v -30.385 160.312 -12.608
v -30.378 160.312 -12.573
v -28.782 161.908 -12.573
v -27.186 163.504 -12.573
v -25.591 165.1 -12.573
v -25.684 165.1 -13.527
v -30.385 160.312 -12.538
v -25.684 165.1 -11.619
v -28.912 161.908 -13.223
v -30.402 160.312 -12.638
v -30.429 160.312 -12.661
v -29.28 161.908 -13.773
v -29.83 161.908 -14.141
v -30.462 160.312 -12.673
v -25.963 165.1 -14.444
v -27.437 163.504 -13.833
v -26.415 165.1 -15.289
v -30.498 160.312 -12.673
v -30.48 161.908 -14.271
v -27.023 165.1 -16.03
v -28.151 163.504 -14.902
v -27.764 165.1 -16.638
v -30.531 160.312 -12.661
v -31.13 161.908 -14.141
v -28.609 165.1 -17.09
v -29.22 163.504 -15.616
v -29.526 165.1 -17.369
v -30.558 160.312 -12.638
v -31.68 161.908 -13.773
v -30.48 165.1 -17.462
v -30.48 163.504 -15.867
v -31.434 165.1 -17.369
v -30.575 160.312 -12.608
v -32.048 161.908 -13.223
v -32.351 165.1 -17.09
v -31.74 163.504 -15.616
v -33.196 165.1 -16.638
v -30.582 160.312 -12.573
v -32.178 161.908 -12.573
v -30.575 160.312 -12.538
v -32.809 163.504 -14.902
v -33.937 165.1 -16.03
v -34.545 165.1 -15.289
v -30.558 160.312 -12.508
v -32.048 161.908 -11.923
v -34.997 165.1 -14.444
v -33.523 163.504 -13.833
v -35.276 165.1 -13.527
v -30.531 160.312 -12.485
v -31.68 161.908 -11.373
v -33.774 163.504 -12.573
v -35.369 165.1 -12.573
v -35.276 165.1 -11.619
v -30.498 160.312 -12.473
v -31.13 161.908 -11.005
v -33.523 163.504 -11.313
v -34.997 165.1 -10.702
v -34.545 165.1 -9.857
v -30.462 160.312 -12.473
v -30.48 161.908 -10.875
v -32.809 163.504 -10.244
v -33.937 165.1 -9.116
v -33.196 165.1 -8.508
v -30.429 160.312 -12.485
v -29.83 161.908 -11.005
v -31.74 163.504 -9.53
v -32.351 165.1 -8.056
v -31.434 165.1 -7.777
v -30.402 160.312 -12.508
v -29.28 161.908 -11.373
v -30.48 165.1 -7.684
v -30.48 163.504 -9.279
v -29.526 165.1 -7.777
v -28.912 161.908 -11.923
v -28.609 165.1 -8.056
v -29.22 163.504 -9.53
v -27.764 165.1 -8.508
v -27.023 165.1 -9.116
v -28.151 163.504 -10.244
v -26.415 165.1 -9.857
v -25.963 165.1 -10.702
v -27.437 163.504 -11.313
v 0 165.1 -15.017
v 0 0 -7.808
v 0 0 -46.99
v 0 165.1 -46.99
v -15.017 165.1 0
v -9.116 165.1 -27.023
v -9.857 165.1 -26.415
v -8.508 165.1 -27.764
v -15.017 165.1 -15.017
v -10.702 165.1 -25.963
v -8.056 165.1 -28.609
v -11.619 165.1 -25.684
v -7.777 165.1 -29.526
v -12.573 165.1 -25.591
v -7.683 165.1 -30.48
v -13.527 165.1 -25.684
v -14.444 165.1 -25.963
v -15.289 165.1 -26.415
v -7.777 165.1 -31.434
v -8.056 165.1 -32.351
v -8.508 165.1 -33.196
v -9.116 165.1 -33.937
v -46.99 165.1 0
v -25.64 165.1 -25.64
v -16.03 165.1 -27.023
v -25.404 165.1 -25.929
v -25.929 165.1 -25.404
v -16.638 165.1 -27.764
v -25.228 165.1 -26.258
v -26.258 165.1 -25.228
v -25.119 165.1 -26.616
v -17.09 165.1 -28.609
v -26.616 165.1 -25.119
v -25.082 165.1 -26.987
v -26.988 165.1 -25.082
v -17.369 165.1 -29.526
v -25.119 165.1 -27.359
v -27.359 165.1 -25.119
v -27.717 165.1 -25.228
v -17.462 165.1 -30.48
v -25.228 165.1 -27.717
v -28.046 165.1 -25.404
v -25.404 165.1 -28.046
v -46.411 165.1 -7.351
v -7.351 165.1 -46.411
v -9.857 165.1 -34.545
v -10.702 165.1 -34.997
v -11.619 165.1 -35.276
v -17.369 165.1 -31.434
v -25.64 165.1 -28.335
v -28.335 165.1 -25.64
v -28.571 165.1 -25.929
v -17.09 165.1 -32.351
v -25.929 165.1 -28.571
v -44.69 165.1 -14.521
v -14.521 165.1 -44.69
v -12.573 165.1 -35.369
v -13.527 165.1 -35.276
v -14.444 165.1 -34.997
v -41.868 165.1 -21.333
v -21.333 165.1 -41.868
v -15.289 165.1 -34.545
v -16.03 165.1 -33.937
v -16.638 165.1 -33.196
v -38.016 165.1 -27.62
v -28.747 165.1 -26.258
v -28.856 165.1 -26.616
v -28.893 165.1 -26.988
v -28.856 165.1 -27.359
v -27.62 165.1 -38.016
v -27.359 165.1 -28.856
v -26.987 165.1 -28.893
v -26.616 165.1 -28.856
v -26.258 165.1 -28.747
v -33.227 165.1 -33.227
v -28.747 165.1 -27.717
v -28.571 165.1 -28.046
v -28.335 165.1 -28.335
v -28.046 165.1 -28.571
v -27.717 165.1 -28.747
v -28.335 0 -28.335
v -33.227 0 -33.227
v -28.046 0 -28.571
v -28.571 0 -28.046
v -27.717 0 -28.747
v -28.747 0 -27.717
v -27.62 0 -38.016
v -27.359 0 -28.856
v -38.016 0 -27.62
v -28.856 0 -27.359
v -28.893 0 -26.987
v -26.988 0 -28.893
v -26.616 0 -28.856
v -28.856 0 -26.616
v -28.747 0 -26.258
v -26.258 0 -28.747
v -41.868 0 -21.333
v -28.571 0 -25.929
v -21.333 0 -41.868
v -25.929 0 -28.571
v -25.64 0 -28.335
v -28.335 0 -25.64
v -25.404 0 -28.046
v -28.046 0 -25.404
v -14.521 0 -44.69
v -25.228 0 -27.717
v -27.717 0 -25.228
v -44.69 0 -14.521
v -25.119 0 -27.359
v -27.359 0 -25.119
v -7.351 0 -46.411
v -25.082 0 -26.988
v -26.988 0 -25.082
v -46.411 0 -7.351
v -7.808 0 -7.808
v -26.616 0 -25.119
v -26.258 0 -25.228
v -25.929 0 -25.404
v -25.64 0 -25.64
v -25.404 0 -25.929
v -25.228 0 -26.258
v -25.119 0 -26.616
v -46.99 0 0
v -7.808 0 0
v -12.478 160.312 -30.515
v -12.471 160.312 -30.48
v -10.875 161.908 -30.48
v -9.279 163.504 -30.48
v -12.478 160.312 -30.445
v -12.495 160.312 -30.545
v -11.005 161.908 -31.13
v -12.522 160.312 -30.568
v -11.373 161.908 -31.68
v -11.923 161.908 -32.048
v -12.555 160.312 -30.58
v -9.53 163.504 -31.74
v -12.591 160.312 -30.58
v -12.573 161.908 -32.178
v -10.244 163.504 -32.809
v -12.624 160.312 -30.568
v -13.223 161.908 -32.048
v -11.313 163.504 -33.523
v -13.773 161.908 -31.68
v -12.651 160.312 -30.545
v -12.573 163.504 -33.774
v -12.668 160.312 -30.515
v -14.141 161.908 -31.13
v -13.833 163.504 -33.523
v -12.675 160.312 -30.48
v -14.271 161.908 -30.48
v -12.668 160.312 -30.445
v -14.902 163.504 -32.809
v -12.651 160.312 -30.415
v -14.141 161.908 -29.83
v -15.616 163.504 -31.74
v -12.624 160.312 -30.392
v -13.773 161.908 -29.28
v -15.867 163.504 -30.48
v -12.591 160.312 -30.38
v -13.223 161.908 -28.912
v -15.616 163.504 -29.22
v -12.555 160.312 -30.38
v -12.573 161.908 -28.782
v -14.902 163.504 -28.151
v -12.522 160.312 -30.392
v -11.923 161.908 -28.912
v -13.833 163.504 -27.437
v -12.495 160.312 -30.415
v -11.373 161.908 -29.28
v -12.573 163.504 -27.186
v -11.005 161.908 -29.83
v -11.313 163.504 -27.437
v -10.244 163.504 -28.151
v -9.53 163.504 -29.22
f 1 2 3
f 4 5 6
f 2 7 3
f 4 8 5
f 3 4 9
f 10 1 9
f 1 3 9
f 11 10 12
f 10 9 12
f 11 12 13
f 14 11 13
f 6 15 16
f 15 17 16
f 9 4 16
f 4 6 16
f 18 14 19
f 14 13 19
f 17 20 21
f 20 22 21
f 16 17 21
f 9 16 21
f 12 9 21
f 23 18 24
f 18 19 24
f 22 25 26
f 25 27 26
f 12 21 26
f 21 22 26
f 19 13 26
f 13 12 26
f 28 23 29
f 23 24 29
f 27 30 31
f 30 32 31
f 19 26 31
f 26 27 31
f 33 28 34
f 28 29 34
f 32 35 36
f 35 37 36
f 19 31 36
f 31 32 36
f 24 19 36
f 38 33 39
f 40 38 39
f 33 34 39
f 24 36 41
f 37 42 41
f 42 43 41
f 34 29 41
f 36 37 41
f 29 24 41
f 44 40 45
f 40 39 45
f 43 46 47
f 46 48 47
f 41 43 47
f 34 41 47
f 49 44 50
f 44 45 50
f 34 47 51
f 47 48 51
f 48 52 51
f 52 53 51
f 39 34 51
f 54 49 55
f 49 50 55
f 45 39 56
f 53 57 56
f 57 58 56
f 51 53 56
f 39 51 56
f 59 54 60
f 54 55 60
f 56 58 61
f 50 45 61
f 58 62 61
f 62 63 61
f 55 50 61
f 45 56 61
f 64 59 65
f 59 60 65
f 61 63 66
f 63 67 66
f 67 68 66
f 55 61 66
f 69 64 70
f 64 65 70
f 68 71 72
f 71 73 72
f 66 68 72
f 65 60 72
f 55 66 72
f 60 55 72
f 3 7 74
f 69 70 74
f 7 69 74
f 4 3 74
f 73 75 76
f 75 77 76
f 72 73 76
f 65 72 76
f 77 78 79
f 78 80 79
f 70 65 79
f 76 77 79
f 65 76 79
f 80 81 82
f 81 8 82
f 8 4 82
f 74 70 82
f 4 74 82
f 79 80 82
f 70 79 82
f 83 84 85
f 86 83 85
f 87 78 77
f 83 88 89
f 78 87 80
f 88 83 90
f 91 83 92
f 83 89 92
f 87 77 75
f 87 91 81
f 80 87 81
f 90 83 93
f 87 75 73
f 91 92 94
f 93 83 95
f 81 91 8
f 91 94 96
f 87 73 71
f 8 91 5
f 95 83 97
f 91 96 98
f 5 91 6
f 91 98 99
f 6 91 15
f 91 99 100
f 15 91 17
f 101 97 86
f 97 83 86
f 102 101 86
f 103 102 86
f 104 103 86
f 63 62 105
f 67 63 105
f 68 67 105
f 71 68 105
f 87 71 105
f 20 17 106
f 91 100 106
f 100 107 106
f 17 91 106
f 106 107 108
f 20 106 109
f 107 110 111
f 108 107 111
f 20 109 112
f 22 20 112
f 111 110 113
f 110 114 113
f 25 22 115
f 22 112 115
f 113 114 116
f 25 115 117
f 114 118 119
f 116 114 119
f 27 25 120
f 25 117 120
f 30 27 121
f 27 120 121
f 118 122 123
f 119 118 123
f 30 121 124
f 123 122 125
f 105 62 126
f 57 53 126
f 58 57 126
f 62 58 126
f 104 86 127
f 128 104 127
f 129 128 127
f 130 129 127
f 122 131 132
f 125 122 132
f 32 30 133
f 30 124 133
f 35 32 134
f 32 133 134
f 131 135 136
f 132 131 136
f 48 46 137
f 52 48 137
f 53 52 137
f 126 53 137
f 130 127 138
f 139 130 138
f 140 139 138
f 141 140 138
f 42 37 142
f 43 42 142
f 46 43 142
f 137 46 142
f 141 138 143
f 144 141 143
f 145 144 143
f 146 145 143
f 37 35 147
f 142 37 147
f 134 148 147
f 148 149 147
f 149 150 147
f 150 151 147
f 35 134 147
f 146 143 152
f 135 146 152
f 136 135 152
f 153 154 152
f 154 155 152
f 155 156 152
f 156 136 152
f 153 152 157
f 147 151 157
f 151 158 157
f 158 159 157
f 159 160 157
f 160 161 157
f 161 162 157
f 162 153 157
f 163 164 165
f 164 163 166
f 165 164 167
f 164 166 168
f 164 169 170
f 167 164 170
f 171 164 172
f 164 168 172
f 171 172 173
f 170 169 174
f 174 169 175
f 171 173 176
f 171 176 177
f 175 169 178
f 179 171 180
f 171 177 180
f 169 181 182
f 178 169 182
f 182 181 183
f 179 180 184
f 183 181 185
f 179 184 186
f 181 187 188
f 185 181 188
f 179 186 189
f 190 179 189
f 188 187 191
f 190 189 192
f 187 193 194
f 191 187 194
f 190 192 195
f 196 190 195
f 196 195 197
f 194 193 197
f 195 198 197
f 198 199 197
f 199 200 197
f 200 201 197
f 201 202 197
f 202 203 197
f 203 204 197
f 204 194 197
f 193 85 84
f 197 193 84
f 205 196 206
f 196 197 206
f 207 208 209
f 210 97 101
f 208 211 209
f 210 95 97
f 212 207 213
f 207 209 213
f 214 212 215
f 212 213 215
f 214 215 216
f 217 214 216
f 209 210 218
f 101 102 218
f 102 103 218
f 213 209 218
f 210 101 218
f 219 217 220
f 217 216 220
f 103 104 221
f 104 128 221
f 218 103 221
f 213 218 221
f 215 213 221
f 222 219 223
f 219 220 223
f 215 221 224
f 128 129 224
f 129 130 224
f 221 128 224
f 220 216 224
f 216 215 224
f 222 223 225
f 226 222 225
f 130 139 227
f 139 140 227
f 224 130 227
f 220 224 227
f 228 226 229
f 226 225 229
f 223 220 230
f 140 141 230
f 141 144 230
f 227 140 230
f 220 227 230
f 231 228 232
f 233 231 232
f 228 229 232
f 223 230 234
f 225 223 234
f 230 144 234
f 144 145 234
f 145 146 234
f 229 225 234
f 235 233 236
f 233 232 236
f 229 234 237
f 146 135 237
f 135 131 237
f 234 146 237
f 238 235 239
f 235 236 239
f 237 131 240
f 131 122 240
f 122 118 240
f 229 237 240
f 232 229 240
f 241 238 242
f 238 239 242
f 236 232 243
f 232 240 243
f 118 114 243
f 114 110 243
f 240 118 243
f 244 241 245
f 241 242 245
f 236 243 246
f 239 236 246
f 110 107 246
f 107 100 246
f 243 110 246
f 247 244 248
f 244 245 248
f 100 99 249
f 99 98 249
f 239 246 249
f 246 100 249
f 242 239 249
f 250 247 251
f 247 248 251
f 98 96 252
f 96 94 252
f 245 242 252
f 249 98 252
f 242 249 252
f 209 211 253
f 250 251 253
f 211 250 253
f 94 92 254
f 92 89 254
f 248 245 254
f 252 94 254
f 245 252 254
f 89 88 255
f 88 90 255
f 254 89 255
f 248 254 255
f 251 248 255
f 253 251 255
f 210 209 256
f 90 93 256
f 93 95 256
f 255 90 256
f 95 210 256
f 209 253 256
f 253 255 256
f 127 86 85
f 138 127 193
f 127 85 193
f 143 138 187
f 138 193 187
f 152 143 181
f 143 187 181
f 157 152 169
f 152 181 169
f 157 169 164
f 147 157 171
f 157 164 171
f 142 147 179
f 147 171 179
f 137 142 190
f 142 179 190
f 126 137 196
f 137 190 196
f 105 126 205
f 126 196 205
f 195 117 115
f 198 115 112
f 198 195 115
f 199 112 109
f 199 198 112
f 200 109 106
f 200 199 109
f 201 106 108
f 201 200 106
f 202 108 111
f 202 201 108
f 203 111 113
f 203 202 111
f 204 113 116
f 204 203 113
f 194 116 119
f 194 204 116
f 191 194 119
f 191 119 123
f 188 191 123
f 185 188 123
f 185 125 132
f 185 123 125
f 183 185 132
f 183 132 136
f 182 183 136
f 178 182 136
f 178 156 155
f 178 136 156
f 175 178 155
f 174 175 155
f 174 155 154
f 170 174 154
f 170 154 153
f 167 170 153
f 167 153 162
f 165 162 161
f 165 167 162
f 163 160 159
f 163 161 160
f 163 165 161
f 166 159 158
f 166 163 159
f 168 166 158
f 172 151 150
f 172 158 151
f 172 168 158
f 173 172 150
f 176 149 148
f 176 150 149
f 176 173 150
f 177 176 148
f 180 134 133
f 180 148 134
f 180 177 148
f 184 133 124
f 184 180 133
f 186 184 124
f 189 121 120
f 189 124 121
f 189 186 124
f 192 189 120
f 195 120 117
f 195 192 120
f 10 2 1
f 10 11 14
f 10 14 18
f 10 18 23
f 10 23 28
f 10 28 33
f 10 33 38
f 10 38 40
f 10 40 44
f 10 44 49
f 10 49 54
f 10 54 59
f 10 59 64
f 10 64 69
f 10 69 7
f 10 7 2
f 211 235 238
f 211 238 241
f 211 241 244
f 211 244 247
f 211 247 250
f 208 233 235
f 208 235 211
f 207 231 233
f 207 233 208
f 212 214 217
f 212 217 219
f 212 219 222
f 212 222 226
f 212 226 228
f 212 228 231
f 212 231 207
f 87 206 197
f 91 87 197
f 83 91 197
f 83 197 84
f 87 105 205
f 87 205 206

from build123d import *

# Parameters (mm, degrees)
SKETCH1_R                    = 46.99
BOSS_EXTRUDE1_DEPTH          = 330.2
SKETCH2_W                    = 44.45
SKETCH2_H                    = 44.45
CUT_EXTRUDE1_DEPTH           = 330.2
CUT_EXTRUDE1_DRAFT           = -2.5
CUT_EXTRUDE2_START           = -330.2
SKETCH3_R                    = 1.905
CUT_EXTRUDE2_DEPTH           = 330.2
CUT_EXTRUDE4_START           = -165.1
CUT_EXTRUDE4_DEPTH           = 165.1
SKETCH8_R                    = 4.8895
CUT_EXTRUDE5_DEPTH           = 4.7879
CUT_EXTRUDE5_DRAFT           = -45
CUT_EXTRUDE5_PROFILE_2_DEPTH = 4.7879
CUT_EXTRUDE5_PROFILE_2_DRAFT = -45


with BuildPart() as part:
    # Sketch1 → Boss-Extrude1 (new body)
    with BuildSketch(Plane(origin=(0, 0, 0), x_dir=(1, 0, 0), z_dir=(0, 1, 0))):
        with Locations(Location((0, 0, 0), (0, 0, 270))):
            Circle(SKETCH1_R)
    extrude(amount=BOSS_EXTRUDE1_DEPTH)


with BuildPart() as cut_extrude1_tool:
    # Sketch2 → Cut-Extrude1 (with draft: the straight prism first)
    with BuildSketch(Plane(origin=(0, 330.2, 0), x_dir=(1, 0, 0), z_dir=(0, 1, 0))):
        Rectangle(SKETCH2_W, SKETCH2_H)
    extrude(amount=-CUT_EXTRUDE1_DEPTH)
    # Cut-Extrude1: the draft: its side faces are tilted about the plane it starts from
    cut_extrude1_sides = [cut_extrude1_tool.faces().sort_by_distance(p)[0] for p in [
        (-22.225, 165.1, 0),
        (0, 165.1, 22.225),
        (22.225, 165.1, 0),
        (0, 165.1, -22.225),
    ]]
    draft(cut_extrude1_sides, Plane(origin=(0, 330.2, 0), x_dir=(1, 0, 0), z_dir=(0, 1, 0)), CUT_EXTRUDE1_DRAFT)


with BuildPart() as part_1:
    add(part.part)

    # Cut-Extrude1: cut by cut_extrude1_tool
    add(cut_extrude1_tool.part, mode=Mode.SUBTRACT)

    # Sketch3 → Cut-Extrude2 (cut)
    with BuildSketch(Plane(origin=(0, 330.2, 0), x_dir=(1, 0, 0), z_dir=(0, 1, 0)).offset(CUT_EXTRUDE2_START)):
        with Locations(Location((-26.9875, 26.9875, 0), (0, 0, 270))):
            Circle(SKETCH3_R)
        with BuildLine():
            Line((0, 12.7), (0, 46.99))
            ThreePointArc((0, 46.99), (33.226947648, -33.226947648), (-46.99, 0))
            Line((-46.99, 0), (-12.7, 0))
            Line((-12.7, 0), (0, 0))
            Line((0, 0), (0, 12.7))
        make_face()
    extrude(amount=CUT_EXTRUDE2_DEPTH, mode=Mode.SUBTRACT)

    # Sketch7 → Cut-Extrude4 (cut)
    with BuildSketch(Plane(origin=(0, 330.2, 0), x_dir=(1, 0, 0), z_dir=(0, 1, 0)).offset(CUT_EXTRUDE4_START)):
        with BuildLine():
            Line((0, 46.99), (0, 0))
            Line((0, 0), (-46.99, 0))
            ThreePointArc((-46.99, 0), (-33.226947648, 33.226947648), (0, 46.99))
        make_face()
    extrude(amount=CUT_EXTRUDE4_DEPTH, mode=Mode.SUBTRACT)


with BuildPart() as cut_extrude5_tool:
    # Sketch8 → Cut-Extrude5 (with draft: the straight prism first)
    with BuildSketch(Plane(origin=(0, 165.1, 0), x_dir=(1, 0, 0), z_dir=(0, 1, 0))):
        with Locations((-12.573, 30.48)):
            Circle(SKETCH8_R)
    extrude(amount=-CUT_EXTRUDE5_DEPTH)
    # Cut-Extrude5: the draft: its side faces are tilted about the plane it starts from
    cut_extrude5_sides = [cut_extrude5_tool.faces().sort_by_distance(p)[0] for p in [
        (-17.4625, 162.70605, -30.48),
    ]]
    draft(cut_extrude5_sides, Plane(origin=(0, 165.1, 0), x_dir=(1, 0, 0), z_dir=(0, 1, 0)), CUT_EXTRUDE5_DRAFT)


with BuildPart() as part_2:
    add(part_1.part)

    # Cut-Extrude5: cut by cut_extrude5_tool
    add(cut_extrude5_tool.part, mode=Mode.SUBTRACT)


with BuildPart() as cut_extrude5_profile_2_tool:
    # Sketch8 → Cut-Extrude5 profile 2 (with draft: the straight prism first)
    with BuildSketch(Plane(origin=(0, 165.1, 0), x_dir=(1, 0, 0), z_dir=(0, 1, 0))):
        with Locations((-30.48, 12.573)):
            Circle(SKETCH8_R)
    extrude(amount=-CUT_EXTRUDE5_PROFILE_2_DEPTH)
    # Cut-Extrude5 profile 2: the draft: its side faces are tilted about the plane it starts from
    cut_extrude5_profile_2_sides = [cut_extrude5_profile_2_tool.faces().sort_by_distance(p)[0] for p in [
        (-35.3695, 162.70605, -12.573),
    ]]
    draft(cut_extrude5_profile_2_sides, Plane(origin=(0, 165.1, 0), x_dir=(1, 0, 0), z_dir=(0, 1, 0)), CUT_EXTRUDE5_PROFILE_2_DRAFT)


with BuildPart() as part_3:
    add(part_2.part)

    # Cut-Extrude5 profile 2: cut by cut_extrude5_profile_2_tool
    add(cut_extrude5_profile_2_tool.part, mode=Mode.SUBTRACT)


solid = part_3.part
